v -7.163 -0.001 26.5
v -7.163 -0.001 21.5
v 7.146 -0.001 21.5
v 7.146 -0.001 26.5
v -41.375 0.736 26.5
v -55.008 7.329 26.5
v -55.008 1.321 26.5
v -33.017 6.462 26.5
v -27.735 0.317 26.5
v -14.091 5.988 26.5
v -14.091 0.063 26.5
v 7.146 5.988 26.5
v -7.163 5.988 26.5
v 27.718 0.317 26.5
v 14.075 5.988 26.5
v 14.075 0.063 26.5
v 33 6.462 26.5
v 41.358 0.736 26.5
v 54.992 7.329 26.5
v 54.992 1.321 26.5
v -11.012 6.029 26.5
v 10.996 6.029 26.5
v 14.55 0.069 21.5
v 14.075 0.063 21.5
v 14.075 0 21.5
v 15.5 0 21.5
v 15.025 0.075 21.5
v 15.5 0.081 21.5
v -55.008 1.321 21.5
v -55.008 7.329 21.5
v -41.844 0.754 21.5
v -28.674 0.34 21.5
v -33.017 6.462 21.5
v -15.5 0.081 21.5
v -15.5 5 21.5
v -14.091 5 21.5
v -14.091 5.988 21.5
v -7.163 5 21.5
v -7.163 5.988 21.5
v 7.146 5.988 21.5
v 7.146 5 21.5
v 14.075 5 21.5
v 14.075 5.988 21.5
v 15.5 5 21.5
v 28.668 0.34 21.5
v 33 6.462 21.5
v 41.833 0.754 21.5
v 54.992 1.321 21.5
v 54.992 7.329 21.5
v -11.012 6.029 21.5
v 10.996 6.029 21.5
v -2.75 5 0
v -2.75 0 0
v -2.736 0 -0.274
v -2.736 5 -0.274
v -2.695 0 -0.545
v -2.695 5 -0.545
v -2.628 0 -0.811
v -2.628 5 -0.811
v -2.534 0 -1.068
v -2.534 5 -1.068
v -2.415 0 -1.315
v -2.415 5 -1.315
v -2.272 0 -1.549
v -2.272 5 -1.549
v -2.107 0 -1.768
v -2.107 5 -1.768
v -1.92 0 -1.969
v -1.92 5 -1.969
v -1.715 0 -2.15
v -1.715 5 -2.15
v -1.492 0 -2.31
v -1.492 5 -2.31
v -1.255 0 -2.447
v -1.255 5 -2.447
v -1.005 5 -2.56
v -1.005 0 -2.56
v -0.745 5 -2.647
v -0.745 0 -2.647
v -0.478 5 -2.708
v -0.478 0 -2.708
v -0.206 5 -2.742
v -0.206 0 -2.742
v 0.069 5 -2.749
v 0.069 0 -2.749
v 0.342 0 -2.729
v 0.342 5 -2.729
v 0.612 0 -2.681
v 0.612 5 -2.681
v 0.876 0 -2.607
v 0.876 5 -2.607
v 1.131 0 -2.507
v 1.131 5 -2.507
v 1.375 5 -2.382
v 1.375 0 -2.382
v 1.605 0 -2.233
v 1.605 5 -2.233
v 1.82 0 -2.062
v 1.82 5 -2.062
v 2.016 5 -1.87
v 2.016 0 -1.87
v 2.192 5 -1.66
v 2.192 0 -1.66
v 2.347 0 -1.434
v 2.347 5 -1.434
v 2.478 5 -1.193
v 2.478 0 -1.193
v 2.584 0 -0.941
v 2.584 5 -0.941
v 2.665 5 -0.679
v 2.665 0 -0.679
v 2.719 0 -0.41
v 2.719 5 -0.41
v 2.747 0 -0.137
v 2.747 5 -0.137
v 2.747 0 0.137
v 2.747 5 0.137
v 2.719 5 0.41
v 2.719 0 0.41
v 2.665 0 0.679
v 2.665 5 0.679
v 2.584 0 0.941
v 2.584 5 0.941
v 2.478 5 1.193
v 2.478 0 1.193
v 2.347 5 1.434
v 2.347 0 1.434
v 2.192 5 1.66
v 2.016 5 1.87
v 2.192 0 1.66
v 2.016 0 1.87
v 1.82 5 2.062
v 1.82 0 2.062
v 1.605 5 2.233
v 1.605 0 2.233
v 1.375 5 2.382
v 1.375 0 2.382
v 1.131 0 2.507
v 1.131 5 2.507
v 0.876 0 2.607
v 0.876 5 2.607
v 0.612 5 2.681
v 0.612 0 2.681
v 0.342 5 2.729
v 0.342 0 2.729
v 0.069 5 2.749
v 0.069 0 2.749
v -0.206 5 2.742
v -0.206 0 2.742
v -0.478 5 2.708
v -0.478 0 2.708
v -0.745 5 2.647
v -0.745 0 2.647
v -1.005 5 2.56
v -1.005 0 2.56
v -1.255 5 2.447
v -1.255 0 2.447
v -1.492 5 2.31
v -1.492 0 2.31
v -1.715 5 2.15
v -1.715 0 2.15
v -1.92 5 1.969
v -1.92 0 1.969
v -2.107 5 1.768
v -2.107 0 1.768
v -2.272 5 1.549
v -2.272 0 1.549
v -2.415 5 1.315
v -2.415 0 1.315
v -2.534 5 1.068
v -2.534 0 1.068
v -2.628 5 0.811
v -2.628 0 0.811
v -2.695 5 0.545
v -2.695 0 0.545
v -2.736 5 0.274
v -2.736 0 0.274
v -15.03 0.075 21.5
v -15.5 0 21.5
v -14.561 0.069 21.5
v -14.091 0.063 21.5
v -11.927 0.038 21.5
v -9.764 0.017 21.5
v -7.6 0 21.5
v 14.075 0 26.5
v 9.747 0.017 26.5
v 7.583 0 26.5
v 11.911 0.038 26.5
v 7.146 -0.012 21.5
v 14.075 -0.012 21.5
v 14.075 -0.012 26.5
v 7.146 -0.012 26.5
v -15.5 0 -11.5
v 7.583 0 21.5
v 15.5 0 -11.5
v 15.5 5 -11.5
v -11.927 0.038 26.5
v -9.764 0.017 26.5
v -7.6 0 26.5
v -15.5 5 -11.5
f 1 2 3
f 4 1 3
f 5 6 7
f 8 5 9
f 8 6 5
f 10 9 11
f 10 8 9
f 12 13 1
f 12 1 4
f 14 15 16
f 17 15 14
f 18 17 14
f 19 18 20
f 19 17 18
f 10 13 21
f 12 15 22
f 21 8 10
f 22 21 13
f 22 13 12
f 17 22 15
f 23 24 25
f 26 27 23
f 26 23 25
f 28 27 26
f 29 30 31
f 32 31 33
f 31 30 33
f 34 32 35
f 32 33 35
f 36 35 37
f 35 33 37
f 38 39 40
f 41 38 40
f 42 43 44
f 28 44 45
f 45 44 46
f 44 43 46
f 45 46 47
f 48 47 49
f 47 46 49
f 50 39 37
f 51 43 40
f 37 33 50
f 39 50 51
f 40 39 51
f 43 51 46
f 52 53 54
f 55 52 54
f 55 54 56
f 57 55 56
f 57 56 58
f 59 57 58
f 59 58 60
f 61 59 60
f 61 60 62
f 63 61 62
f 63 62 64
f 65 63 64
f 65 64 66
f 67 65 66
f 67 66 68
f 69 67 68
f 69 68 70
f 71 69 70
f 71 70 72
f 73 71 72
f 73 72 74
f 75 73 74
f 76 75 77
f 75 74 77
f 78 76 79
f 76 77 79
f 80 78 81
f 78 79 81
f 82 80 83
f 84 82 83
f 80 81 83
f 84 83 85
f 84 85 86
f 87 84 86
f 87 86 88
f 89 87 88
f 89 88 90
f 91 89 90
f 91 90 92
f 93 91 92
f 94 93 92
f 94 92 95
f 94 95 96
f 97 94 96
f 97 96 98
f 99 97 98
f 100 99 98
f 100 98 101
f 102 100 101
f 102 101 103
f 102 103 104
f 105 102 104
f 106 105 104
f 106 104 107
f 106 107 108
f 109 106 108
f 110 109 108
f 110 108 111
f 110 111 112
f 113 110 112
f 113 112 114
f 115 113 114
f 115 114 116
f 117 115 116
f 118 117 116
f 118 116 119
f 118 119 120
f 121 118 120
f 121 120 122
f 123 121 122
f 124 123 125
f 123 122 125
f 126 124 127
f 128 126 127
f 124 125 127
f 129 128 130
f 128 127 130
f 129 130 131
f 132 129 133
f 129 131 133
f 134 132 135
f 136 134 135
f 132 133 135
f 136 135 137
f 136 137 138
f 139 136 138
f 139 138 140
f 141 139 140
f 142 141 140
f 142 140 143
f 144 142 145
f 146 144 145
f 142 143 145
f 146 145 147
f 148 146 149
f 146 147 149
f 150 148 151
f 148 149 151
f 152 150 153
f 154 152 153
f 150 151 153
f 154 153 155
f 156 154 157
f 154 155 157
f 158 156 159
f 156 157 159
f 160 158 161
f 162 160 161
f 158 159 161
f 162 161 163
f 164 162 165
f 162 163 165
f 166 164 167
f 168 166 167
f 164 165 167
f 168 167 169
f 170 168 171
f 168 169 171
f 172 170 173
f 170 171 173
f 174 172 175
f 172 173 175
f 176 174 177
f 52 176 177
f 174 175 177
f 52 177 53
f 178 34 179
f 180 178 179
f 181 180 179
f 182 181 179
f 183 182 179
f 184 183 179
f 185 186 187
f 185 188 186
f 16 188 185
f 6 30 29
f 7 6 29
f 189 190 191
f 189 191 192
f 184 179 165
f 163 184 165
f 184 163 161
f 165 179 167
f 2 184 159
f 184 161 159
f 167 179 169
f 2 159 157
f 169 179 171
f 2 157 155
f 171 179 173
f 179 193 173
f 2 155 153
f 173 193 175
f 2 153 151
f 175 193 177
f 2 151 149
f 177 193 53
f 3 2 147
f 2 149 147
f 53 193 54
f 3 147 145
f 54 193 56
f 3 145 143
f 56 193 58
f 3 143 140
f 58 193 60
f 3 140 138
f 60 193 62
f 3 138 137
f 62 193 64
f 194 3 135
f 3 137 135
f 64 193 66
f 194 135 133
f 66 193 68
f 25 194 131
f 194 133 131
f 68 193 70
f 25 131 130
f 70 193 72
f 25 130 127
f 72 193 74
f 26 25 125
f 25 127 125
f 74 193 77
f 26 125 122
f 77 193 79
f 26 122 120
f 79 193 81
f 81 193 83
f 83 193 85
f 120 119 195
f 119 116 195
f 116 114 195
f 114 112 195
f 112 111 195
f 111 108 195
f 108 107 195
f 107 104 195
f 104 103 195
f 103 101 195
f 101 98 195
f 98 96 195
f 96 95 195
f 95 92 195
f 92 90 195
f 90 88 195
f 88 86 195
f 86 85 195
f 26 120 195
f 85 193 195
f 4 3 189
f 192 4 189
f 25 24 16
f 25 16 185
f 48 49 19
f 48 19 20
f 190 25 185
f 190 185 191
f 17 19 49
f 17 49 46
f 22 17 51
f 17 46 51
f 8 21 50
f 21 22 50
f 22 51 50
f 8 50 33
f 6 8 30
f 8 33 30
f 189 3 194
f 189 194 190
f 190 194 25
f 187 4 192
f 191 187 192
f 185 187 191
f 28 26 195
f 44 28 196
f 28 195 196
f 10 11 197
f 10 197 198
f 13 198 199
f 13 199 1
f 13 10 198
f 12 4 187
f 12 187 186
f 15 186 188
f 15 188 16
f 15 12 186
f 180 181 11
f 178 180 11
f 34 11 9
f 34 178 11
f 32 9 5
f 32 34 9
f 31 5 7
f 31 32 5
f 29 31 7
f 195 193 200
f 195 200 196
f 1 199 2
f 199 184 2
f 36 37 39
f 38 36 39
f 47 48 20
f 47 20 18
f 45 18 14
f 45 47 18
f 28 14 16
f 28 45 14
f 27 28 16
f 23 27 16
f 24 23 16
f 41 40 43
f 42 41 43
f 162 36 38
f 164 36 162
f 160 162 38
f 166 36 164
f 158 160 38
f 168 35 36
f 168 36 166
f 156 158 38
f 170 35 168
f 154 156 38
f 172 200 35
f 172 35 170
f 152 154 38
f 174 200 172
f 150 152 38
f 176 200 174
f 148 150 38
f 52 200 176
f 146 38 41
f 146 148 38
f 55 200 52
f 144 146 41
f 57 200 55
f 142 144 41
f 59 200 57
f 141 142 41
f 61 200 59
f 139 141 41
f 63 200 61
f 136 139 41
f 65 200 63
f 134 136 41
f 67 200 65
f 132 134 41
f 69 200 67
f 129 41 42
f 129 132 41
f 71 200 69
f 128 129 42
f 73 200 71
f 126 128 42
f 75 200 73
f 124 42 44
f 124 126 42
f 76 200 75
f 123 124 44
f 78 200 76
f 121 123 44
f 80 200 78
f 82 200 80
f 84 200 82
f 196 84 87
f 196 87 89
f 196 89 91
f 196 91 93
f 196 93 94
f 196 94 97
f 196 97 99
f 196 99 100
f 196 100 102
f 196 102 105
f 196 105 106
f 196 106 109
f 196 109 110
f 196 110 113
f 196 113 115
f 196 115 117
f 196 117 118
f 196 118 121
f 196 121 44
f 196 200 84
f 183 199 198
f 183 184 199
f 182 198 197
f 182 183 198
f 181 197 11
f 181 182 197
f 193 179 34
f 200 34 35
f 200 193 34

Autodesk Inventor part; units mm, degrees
ref_plane "YZ-Ebene" through (0, 0, 0) normal (1, 0, 0) x (0, 1, 0)
ref_plane "XZ-Ebene" through (0, 0, 0) normal (0, 1, 0) x (-1, 0, 0)
ref_plane "XY-Ebene" through (0, 0, 0) normal (0, 0, 1) x (1, 0, 0)
sketch "Skizze1" plane through (0, 0, 0) normal (0, 1, 0) x (-1, 0, 0)
  line L0 (-15.5, 11.5) -> (15.5, 11.5)
  line L1 (15.5, 11.5) -> (15.5, -11.5)
  line L2 (15.5, -11.5) -> (-15.5, -11.5)
  line L3 (-15.5, -11.5) -> (-15.5, 11.5)
  line L4 (148.7552, 0) -> (-148.7387, 0) projected
  line L5 (0, -18.1) -> (0, 28.1) projected
  line L6 (0, -11.5) -> (0, 11.5)
  circle A0 centre (0, 0) radius 2.75
  dimension "d0" = 23
  dimension "d1" = 31
  dimension "d3" = 5.5
extrude "Extrusion1" add sketch "Skizze1" along normal blind 5 contours L0 L5 A0 L4 L3 | L0 L1 L4 A0 L5 | L4 A0 L5 L2 L3 | L1 L2 L5 A0 L4
sketch "Skizze2" plane through (-15.5, 0, 11.5) normal (0, 0, 1) x (1, 0, 0)
  line L0 (0, 0) -> (31, 0) projected
  line L1 (31, 0) -> (31, 5) projected
  line L2 (0, 5) -> (31, 5) projected
  line L3 (0, 0) -> (0, 5) projected
  line L4 (0, 0) -> (31, 0) projected
  line L5 (31, 0) -> (31, 5) projected
  line L6 (0, 5) -> (31, 5) projected
  line L7 (0, 0) -> (0, 5) projected
  point P0 (15.5, 0)
extrude "Extrusion2" add sketch "Skizze2" along normal blind 10
sketch "Skizze3" plane through (-15.5, 0, 21.5) normal (0, 0, 1) x (1, 0, 0)
  line L0 (0, 0) -> (31, 0) projected
  arc A0 (-90.0082, 12.8816) -> (120.9918, 12.8816) centre (15.4918, 1123.4066) ccw
  line L1 (8.3371, 5.988) -> (1.4088, 5.988)
  line L2 (1.4088, 5.988) -> (1.4088, -0.012)
  line L3 (8.3371, -0.012) -> (1.4088, -0.012)
  line L4 (8.3371, 5.988) -> (8.3371, -0.012)
  line L5 (29.5747, 5.988) -> (22.6465, 5.988)
  line L6 (22.6465, 5.988) -> (22.6465, -0.012)
  line L7 (29.5747, -0.012) -> (22.6465, -0.012)
  line L8 (29.5747, 5.988) -> (29.5747, -0.012)
  line L9 (70.4918, 10.8726) -> (70.4918, -5.7752)
  line L10 (-39.5082, 12.8816) -> (-39.5082, -5.1111)
  arc A1 (-39.5082, 7.3287) -> (70.4918, 7.3287) centre (15.4918, 1123.4066) ccw
  arc A2 (-90.7561, 5.0098) -> (121.7396, 5.0098) centre (15.4918, 1123.4066) ccw
  line L11 (8.3371, 5.988) -> (1.4088, 5.988)
  line L12 (1.4088, 5.988) -> (1.4088, -0.012)
  line L13 (8.3371, -0.012) -> (1.4088, -0.012)
  line L14 (8.3371, 5.988) -> (8.3371, -0.012)
  point P0 (15.5, 0)
  point P1 (15.4918, 5.988)
  point P2 (-39.5082, 6.6061)
  point P3 (70.4918, 1.3214)
  point P4 (-39.5082, 1.3214)
  point P5 (7.8951, 0)
  point P6 (22.6465, 0)
  point P7 (29.5747, 0.0626)
  dimension "d9" = 6
  dimension "d10" = 110
extrude "Extrusion3" add sketch "Skizze3" along normal blind 5 contours A2 L2 L1 L4 L0 | A2 L10 A1 L9 L8 L5 L6 L0 L4 L1 L2 | L6 L5 L8 A2 L0 | L0 L8 L7 L6 | A2 L8 L0
properties part number "01-06 Absicherung Box"
